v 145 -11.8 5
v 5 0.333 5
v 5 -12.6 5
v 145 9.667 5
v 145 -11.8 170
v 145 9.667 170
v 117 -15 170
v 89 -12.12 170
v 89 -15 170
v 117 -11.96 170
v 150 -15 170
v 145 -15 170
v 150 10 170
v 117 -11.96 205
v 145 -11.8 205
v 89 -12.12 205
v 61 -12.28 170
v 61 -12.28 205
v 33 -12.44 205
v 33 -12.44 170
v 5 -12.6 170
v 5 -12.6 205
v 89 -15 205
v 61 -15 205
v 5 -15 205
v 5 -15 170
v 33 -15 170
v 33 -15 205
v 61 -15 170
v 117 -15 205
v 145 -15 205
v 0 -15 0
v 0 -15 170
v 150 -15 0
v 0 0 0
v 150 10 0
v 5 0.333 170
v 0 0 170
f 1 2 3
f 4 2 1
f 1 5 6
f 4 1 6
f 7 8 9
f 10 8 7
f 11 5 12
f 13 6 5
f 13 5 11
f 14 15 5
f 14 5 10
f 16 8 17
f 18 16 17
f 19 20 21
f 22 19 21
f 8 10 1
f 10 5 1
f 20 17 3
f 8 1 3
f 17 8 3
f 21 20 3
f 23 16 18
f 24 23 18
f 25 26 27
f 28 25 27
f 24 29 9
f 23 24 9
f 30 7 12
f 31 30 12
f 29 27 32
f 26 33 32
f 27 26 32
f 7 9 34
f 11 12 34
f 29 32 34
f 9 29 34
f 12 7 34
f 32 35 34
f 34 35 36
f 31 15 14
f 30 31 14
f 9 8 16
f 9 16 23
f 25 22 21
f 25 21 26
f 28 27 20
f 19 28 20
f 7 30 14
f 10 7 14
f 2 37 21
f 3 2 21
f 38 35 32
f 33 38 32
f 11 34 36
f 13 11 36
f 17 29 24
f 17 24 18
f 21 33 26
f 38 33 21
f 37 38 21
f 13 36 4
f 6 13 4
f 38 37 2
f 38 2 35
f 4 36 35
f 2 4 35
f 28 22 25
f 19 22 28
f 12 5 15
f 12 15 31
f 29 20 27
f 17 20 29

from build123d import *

# Parameters (mm, degrees)
BOSS_EXTRUDE1_DEPTH = 170
CUT_EXTRUDE1_DEPTH  = 165
BOSS_EXTRUDE2_DEPTH = 35
BOSS_EXTRUDE3_DEPTH = 35


with BuildPart() as part:
    # Sketch1 → Boss-Extrude1 (new body)
    with BuildSketch(Plane.XY):
        Polygon((0, 0), (0, -15), (150, -15), (150, 10), align=None)
    extrude(amount=BOSS_EXTRUDE1_DEPTH)

    # Sketch2 → Cut-Extrude1 (cut)
    with BuildSketch(Plane.XY.offset(170)):
        Polygon((5, 0.333333333), (5, -12.6), (145, -11.8), (145, 9.666666667), align=None)
    extrude(amount=-CUT_EXTRUDE1_DEPTH, mode=Mode.SUBTRACT)

    # Sketch3 → Boss-Extrude2 (add)
    with BuildSketch(Plane.XY.offset(170)):
        Polygon((145, -11.8), (145, -15), (117, -15), (117, -11.96), align=None)
    extrude(amount=BOSS_EXTRUDE2_DEPTH)

    # Sketch4 → Boss-Extrude3 (add)
    with BuildSketch(Plane.XY.offset(170)):
        Polygon((89, -12.12), (89, -15), (61, -15), (61, -12.28), align=None)
        Polygon((5, -12.6), (5, -15), (33, -15), (33, -12.44), align=None)
    extrude(amount=BOSS_EXTRUDE3_DEPTH)


solid = part.part
